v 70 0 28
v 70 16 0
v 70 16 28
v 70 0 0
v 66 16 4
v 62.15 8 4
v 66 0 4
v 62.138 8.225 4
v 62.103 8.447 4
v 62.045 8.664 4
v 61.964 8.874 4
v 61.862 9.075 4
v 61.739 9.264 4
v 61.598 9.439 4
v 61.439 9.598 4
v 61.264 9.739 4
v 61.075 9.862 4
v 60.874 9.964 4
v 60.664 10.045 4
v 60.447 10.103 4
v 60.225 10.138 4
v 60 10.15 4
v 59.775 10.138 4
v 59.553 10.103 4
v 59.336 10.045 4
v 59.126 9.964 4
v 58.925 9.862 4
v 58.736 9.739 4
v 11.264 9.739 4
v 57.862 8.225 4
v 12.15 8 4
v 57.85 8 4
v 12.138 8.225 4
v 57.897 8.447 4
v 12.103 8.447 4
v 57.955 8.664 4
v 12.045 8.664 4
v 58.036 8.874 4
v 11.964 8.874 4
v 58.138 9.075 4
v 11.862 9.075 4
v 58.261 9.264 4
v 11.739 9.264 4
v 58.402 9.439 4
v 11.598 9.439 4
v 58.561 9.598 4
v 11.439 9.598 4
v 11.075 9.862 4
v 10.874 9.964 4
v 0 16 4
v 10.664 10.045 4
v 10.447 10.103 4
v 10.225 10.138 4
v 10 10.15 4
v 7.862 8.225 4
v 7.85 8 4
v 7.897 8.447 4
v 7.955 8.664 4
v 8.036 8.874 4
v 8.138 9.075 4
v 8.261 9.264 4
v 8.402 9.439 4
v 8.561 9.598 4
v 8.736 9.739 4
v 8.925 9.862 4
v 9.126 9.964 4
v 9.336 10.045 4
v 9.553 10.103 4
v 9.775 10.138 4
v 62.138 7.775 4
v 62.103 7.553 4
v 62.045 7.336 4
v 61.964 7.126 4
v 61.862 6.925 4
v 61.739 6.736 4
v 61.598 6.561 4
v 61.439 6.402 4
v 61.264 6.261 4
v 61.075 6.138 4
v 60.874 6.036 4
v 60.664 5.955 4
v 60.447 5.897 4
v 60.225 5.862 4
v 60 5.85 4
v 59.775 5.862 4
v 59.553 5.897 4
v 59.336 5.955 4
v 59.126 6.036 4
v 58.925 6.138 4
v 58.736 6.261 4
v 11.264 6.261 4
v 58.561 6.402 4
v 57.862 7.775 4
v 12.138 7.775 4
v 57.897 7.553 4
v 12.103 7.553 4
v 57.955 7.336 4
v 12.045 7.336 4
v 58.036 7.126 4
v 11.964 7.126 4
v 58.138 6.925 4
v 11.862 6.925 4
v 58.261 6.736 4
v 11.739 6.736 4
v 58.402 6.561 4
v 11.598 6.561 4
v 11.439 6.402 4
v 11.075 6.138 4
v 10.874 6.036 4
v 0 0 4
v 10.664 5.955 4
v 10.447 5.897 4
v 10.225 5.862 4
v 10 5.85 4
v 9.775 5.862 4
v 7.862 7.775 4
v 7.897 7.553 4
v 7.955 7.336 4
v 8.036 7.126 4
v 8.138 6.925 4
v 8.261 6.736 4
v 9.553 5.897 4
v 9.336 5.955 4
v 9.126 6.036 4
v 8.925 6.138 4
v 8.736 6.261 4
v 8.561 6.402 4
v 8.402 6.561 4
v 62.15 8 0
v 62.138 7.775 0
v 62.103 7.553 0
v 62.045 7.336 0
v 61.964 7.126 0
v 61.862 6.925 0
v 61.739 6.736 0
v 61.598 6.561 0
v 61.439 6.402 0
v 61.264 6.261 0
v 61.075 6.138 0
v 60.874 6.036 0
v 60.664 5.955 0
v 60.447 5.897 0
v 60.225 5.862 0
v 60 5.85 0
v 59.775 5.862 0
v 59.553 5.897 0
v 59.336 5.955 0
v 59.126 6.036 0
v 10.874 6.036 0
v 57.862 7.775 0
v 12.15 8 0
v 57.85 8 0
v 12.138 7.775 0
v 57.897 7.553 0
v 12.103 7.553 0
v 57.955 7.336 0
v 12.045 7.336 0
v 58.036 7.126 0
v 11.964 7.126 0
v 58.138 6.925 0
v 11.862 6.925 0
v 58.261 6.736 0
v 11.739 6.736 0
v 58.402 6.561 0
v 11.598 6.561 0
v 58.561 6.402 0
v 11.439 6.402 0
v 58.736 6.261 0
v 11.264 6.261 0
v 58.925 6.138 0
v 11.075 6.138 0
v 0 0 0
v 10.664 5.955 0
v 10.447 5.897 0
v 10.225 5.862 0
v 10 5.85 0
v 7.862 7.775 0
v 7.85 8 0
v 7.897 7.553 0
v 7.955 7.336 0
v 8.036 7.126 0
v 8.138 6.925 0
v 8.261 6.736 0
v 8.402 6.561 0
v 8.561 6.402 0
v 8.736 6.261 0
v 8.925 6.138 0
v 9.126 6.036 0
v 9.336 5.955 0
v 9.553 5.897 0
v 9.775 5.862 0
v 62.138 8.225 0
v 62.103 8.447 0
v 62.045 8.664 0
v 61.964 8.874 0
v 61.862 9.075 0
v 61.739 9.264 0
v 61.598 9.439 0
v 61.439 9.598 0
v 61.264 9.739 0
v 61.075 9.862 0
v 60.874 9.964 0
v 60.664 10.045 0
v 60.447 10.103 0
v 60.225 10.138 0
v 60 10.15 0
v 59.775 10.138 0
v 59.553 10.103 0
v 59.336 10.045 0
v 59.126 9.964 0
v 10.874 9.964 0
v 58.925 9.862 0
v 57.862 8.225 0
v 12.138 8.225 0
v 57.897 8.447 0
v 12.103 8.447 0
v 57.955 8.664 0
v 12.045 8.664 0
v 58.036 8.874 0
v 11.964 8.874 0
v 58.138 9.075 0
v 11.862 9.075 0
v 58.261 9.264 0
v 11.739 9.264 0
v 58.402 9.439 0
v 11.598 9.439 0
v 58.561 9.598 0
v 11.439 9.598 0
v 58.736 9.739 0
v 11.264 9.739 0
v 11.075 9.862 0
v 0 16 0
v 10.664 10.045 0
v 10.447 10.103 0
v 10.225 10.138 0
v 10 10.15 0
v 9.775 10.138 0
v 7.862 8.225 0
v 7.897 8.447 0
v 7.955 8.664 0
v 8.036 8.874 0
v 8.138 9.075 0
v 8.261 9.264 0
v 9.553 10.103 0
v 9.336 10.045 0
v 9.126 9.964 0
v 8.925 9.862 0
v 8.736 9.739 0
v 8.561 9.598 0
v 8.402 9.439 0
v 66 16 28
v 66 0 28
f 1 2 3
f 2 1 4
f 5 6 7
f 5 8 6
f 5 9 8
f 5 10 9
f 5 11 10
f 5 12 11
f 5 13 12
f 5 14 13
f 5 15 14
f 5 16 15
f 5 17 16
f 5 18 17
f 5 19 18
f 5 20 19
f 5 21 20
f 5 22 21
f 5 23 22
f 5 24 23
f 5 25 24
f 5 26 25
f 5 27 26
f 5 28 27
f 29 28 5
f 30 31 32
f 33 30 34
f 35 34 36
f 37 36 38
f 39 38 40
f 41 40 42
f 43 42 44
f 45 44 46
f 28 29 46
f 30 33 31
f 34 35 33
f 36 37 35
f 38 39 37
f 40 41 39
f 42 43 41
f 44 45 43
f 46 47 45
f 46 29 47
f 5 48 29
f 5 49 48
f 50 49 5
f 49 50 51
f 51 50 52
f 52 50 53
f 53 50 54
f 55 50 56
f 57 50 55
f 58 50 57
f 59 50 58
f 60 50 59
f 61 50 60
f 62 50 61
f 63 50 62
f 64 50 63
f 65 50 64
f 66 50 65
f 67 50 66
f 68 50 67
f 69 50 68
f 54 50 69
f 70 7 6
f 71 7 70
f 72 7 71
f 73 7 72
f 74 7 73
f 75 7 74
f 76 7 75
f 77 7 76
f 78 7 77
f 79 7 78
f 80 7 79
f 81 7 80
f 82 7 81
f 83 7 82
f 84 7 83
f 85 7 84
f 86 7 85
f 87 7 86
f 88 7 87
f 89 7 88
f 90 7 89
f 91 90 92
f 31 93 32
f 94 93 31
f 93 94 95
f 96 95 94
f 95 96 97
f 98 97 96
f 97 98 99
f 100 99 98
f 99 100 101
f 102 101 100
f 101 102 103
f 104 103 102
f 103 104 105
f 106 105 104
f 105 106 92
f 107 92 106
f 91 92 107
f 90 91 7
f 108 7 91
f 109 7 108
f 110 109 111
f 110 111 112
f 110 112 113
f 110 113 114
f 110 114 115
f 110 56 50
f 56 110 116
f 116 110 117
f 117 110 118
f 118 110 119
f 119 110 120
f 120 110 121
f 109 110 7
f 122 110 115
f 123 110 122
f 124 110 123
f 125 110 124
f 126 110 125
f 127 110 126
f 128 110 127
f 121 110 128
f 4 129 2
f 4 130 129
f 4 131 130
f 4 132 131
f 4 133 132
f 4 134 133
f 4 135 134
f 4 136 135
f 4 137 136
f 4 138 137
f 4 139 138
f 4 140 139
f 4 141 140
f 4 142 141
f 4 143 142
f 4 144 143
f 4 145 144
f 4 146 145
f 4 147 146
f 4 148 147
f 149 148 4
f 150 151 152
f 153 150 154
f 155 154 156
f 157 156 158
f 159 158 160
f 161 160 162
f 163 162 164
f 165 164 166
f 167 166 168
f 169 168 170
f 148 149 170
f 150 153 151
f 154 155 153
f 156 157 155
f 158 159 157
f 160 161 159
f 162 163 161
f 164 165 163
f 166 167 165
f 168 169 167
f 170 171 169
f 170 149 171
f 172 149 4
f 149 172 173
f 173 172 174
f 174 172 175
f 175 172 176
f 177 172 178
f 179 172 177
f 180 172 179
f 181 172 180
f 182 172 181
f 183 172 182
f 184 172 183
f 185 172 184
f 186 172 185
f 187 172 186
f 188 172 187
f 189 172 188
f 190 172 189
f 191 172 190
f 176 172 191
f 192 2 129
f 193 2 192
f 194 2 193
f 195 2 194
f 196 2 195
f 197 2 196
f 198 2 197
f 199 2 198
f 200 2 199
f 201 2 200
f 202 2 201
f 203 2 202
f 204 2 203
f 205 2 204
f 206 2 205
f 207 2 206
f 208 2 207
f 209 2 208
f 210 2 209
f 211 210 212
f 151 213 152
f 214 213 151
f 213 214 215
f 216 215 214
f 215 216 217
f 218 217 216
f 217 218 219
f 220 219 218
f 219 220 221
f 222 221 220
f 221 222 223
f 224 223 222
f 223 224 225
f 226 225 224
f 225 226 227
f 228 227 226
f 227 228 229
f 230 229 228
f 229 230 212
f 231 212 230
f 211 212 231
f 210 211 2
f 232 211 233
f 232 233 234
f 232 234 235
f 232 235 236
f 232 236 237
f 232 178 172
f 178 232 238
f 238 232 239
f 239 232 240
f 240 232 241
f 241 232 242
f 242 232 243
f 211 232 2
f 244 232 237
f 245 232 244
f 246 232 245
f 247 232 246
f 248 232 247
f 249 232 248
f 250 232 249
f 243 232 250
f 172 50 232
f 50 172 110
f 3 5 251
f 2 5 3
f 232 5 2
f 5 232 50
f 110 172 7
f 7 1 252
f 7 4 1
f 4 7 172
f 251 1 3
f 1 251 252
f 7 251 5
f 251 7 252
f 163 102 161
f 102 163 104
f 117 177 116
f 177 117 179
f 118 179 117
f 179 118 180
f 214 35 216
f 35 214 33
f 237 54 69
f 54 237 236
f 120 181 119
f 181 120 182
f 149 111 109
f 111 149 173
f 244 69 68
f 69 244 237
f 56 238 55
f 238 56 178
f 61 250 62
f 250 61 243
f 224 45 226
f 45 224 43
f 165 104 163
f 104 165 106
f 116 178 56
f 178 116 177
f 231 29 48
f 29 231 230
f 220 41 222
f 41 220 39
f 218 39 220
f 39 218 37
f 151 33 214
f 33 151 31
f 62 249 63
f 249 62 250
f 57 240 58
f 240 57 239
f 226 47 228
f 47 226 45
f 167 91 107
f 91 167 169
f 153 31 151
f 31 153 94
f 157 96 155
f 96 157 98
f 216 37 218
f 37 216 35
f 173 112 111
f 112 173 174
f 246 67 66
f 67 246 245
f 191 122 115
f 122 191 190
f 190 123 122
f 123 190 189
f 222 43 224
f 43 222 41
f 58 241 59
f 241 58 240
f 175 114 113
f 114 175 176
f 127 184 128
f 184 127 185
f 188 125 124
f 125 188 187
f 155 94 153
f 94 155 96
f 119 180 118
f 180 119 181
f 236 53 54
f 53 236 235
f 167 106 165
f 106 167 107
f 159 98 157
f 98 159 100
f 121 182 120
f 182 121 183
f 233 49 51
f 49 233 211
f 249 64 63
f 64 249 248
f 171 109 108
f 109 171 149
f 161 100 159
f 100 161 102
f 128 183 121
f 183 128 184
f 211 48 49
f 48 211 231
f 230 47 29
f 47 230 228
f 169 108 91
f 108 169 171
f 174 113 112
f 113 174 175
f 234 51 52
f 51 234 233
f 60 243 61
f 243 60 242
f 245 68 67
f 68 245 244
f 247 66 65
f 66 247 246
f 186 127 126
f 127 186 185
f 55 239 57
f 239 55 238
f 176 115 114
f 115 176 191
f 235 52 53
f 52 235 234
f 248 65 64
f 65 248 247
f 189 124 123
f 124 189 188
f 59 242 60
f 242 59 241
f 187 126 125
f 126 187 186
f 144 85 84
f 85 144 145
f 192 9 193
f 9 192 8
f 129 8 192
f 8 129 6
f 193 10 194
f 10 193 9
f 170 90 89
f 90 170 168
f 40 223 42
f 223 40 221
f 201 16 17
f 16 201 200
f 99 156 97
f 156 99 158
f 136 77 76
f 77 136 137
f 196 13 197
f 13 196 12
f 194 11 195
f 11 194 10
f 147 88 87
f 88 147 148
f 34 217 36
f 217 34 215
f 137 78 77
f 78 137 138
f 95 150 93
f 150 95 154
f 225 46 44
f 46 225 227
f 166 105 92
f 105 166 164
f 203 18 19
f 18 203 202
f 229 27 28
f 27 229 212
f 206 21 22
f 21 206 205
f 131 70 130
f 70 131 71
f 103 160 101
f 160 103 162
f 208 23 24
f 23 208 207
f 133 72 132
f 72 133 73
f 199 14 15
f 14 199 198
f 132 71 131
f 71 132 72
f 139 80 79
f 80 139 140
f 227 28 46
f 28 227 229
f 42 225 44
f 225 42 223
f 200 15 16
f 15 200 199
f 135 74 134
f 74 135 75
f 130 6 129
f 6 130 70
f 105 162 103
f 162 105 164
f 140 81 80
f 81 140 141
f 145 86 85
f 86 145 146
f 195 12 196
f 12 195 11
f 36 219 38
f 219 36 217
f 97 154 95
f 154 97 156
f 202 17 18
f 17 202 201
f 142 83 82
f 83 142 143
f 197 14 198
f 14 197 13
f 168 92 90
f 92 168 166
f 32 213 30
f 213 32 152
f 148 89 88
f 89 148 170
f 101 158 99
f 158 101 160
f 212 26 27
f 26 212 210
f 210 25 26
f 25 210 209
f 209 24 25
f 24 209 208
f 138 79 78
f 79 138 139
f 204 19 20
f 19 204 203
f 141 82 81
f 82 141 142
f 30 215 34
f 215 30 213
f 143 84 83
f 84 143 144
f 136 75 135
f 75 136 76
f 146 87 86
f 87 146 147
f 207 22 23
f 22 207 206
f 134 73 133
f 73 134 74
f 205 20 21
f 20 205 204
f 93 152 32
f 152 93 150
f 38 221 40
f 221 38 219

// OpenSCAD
// Latch hook bracket.
$fn = 60;
eps = 0.02;
length = 70;
height = 24;
width = 16;
thickness = 4;
difference() { union() { cube([length,width,thickness]); translate([length-thickness,0,thickness]) cube([thickness,width,height]); } for(x=[10,length-10]) translate([x,width/2,-eps]) cylinder(d=4.3,h=thickness+2*eps); }
